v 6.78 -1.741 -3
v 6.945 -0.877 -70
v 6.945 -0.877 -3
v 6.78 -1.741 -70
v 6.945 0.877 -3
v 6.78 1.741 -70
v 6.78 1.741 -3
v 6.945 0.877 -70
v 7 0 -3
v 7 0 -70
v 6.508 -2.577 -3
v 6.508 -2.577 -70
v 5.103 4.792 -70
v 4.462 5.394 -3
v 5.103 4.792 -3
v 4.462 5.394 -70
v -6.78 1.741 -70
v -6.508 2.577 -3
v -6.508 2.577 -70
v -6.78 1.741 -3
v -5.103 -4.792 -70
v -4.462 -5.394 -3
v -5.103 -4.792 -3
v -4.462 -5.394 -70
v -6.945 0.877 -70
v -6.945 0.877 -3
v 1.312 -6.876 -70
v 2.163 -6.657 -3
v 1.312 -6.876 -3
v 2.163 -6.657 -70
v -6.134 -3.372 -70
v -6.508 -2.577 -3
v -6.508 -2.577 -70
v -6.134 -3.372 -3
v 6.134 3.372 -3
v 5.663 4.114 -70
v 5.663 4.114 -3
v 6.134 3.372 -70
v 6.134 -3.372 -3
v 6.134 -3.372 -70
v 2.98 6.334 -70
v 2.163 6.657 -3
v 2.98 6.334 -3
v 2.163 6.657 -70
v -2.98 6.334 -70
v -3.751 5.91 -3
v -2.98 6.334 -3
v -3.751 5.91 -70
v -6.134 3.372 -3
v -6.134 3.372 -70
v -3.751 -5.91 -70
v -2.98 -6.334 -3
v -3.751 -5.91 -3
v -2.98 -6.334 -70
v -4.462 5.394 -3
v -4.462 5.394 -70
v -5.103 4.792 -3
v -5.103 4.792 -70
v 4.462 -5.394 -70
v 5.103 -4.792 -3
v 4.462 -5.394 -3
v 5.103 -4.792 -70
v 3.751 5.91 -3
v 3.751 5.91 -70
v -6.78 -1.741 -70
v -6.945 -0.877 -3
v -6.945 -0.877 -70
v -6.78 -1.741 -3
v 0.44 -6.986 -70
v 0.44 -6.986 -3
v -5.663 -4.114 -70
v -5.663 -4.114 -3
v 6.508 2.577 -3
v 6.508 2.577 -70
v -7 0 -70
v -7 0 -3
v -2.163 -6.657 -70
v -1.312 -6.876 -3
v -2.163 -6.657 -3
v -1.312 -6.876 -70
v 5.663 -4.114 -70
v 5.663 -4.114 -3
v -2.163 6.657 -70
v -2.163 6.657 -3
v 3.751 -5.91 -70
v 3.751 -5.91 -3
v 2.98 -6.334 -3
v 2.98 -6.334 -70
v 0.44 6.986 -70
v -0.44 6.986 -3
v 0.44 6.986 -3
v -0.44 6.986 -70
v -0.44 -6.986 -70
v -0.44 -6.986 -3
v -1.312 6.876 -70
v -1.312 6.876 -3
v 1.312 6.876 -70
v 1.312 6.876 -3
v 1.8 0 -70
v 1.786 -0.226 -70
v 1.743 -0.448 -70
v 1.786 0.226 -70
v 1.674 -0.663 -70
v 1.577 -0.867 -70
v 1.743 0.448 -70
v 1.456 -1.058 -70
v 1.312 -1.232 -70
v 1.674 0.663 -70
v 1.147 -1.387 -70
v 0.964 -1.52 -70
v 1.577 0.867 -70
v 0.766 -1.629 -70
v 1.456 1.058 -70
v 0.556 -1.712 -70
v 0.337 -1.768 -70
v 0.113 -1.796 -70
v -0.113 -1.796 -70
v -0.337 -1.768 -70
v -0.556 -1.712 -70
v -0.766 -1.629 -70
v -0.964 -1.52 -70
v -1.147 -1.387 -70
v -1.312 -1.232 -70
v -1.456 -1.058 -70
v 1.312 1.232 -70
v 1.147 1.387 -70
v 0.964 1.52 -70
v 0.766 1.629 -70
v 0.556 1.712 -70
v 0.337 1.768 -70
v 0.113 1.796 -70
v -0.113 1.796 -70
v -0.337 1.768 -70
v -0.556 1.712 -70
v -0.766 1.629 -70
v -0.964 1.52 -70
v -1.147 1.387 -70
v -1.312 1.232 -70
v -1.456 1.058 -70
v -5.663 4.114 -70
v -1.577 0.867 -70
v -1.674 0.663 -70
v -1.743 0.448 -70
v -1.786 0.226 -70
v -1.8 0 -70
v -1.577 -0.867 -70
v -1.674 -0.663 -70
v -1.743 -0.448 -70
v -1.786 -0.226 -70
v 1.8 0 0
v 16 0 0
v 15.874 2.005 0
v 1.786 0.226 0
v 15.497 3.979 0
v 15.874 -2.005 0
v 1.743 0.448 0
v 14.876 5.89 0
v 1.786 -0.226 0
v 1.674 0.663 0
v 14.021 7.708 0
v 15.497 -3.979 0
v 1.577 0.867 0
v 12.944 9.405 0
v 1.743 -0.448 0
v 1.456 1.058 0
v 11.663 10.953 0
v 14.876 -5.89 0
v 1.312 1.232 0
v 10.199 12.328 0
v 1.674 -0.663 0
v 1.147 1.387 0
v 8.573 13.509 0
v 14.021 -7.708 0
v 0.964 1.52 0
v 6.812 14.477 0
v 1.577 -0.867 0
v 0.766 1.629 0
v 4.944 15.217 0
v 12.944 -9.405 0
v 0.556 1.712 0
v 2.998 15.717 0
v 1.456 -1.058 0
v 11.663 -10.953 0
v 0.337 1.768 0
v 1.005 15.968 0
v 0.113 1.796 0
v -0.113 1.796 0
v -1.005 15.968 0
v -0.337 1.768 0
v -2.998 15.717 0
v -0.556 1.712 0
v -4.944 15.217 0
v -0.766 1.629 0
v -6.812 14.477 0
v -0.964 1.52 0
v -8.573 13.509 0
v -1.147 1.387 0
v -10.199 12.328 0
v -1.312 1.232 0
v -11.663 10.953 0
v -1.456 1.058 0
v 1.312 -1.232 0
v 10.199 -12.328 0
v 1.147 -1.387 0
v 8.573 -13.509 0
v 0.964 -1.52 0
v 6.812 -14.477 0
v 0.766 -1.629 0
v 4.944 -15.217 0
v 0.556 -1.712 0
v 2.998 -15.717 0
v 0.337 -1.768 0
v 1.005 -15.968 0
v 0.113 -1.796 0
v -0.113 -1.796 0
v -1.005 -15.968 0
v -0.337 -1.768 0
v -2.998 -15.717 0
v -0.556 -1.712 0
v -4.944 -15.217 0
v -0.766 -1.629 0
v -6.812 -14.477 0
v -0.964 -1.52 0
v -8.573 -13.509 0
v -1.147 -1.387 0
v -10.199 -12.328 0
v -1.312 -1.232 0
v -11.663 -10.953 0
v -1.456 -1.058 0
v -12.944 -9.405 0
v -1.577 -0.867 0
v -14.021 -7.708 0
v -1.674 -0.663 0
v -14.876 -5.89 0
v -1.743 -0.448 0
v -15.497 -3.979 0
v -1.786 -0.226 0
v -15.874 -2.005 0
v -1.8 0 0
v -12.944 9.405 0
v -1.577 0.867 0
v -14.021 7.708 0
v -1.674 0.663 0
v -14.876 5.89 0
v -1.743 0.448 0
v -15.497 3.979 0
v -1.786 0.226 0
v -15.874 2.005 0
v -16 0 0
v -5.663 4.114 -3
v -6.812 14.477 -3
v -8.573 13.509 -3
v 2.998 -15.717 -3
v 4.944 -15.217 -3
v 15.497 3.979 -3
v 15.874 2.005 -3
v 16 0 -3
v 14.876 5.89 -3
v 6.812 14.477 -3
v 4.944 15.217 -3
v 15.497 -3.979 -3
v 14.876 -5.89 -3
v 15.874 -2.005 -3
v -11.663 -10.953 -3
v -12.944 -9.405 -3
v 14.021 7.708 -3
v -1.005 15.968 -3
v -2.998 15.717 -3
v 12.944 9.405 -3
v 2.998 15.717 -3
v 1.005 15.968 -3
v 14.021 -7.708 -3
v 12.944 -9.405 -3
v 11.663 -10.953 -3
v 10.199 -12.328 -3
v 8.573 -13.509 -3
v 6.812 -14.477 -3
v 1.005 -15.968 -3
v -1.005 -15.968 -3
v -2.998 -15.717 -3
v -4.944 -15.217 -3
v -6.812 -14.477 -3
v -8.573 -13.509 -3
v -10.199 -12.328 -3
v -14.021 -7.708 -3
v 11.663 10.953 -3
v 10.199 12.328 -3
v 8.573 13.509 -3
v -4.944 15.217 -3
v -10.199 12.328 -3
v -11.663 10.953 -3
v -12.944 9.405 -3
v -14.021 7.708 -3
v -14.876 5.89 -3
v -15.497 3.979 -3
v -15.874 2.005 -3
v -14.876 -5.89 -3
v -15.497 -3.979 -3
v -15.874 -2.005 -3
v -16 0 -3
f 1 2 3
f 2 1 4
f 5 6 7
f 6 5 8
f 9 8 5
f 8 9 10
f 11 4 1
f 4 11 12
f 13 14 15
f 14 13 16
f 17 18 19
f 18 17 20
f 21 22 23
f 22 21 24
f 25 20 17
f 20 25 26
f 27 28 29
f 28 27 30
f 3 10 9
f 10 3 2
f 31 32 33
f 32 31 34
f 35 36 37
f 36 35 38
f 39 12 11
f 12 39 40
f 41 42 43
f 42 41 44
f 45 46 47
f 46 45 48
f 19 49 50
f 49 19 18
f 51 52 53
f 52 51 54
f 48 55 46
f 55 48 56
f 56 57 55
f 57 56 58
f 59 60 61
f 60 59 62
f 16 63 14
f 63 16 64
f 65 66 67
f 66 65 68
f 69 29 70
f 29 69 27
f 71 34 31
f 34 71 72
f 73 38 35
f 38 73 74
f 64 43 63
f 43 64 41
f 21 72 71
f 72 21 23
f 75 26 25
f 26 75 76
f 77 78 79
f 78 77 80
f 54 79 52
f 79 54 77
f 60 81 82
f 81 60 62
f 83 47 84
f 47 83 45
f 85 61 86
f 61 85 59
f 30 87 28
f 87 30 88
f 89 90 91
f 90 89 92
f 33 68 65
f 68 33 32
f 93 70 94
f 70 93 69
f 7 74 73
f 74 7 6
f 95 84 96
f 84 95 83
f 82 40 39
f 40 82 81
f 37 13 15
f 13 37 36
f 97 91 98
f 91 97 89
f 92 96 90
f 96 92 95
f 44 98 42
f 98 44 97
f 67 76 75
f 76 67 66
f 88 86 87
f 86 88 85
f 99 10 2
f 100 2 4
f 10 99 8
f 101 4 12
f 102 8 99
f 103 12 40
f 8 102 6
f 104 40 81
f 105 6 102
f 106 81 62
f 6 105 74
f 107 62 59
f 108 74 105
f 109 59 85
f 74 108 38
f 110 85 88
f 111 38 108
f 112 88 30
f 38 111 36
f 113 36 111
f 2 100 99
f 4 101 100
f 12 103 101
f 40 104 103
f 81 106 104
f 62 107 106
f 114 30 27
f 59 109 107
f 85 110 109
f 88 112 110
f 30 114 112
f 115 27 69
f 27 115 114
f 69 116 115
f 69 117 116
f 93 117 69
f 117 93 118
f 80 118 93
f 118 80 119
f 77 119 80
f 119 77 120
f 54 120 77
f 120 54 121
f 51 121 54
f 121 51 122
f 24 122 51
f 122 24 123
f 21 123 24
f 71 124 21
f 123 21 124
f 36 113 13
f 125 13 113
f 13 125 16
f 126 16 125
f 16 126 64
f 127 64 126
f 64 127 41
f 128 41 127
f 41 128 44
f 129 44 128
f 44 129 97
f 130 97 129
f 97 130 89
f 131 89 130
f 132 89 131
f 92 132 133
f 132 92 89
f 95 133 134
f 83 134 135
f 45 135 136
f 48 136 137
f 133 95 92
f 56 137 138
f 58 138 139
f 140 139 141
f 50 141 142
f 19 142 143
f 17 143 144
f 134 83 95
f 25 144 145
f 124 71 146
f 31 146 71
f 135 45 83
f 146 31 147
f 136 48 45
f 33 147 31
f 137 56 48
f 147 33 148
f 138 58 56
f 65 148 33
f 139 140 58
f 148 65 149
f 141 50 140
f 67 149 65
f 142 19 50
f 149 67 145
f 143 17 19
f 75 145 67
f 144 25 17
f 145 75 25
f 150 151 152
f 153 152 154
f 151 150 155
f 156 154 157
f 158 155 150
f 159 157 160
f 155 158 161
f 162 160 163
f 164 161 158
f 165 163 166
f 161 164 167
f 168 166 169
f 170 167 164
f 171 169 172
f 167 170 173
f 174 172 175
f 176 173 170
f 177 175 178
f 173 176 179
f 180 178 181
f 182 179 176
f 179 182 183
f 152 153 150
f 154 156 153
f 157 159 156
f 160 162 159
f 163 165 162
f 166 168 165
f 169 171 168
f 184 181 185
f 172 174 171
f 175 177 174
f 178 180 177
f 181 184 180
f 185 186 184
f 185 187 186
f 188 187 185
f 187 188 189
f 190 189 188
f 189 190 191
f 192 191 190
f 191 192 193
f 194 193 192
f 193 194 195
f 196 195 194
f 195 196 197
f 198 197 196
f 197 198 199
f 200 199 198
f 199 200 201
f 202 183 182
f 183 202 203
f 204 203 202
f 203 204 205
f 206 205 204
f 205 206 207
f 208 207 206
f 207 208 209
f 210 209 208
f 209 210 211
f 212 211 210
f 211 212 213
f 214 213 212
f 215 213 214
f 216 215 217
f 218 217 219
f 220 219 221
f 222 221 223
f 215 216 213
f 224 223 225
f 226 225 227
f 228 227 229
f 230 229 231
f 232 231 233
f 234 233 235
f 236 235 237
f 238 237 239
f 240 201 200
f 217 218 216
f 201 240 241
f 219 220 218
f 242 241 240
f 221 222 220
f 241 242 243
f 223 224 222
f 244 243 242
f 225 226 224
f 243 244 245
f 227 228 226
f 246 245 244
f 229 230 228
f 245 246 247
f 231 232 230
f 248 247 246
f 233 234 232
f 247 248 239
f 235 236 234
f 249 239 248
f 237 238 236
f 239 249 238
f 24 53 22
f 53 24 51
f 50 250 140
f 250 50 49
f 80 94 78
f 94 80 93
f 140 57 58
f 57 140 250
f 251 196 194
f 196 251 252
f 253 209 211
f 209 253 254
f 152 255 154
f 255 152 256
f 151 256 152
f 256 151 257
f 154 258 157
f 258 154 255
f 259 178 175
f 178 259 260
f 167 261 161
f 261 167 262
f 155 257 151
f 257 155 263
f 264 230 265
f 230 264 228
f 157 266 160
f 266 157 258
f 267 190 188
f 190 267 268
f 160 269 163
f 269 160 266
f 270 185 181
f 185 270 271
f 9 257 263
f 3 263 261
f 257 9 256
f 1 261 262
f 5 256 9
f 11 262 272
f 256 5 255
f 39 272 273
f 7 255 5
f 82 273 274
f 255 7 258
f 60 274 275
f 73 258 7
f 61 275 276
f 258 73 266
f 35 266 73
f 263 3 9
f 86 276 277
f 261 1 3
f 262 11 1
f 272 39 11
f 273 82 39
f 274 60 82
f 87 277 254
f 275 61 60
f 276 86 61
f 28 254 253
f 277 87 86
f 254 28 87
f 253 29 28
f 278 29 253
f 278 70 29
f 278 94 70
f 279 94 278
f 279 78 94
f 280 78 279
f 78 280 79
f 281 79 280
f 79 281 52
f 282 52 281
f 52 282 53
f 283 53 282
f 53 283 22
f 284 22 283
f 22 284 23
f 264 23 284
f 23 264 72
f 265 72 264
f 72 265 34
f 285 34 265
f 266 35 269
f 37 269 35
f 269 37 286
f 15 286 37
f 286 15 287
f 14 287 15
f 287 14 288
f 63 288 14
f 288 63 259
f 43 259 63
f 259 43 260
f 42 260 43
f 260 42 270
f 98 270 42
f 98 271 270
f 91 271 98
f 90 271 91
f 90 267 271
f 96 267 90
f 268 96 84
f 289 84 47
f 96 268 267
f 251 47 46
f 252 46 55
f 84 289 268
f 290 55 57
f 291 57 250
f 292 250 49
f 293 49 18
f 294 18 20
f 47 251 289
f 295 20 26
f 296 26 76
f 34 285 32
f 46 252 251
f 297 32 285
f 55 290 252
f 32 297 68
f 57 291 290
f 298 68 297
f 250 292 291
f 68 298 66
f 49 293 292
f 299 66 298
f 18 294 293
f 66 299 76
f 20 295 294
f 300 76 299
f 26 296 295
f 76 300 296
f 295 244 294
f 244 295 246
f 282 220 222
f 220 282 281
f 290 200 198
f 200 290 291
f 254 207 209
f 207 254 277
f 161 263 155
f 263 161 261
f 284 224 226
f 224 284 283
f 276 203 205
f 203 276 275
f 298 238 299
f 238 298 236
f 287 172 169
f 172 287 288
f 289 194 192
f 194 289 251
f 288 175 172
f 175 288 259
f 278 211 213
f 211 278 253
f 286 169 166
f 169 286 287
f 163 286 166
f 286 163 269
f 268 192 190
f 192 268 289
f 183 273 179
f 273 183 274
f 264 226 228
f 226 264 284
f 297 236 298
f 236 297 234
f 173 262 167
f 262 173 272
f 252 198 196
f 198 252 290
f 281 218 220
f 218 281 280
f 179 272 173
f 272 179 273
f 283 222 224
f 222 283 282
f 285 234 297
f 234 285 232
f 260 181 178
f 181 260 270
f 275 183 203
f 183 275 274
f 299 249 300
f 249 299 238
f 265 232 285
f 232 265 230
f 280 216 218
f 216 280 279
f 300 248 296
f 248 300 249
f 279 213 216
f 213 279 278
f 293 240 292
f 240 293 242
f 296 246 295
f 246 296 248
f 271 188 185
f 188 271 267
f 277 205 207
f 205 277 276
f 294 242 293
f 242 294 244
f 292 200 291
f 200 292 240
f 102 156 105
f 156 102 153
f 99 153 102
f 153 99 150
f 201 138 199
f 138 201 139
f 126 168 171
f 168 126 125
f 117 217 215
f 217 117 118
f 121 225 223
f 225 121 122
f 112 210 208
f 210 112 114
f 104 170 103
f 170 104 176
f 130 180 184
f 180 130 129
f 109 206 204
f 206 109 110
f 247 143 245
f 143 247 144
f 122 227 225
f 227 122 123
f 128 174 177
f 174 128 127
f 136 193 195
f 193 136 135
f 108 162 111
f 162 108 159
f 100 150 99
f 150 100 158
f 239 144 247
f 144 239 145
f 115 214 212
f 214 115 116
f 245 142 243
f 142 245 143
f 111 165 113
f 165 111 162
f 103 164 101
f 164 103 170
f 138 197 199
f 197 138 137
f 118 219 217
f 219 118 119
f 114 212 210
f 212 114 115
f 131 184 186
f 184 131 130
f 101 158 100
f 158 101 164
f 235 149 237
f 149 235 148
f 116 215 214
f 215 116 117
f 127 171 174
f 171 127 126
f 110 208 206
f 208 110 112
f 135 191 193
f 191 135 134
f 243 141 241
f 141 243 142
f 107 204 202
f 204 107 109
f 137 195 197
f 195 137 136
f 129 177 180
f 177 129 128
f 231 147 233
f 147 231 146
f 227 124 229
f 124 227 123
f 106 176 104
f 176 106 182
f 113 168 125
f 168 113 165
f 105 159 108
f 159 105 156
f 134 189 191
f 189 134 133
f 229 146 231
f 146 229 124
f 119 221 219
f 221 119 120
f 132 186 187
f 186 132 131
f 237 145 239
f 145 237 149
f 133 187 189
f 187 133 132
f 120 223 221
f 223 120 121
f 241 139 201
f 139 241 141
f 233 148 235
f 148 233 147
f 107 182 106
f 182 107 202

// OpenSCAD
$fn = 50;


difference() {
	union() {
		translate(v = [0, 0, -70.0000000000]) {
			cylinder(h = 70, r = 7.0000000000);
		}
		translate(v = [0, 0, -3.0000000000]) {
			cylinder(h = 3, r = 16.0000000000);
		}
	}
	union() {
		#translate(v = [0, 0, -70]) {
			cylinder(h = 70, r = 1.8000000000);
		}
	}
}
